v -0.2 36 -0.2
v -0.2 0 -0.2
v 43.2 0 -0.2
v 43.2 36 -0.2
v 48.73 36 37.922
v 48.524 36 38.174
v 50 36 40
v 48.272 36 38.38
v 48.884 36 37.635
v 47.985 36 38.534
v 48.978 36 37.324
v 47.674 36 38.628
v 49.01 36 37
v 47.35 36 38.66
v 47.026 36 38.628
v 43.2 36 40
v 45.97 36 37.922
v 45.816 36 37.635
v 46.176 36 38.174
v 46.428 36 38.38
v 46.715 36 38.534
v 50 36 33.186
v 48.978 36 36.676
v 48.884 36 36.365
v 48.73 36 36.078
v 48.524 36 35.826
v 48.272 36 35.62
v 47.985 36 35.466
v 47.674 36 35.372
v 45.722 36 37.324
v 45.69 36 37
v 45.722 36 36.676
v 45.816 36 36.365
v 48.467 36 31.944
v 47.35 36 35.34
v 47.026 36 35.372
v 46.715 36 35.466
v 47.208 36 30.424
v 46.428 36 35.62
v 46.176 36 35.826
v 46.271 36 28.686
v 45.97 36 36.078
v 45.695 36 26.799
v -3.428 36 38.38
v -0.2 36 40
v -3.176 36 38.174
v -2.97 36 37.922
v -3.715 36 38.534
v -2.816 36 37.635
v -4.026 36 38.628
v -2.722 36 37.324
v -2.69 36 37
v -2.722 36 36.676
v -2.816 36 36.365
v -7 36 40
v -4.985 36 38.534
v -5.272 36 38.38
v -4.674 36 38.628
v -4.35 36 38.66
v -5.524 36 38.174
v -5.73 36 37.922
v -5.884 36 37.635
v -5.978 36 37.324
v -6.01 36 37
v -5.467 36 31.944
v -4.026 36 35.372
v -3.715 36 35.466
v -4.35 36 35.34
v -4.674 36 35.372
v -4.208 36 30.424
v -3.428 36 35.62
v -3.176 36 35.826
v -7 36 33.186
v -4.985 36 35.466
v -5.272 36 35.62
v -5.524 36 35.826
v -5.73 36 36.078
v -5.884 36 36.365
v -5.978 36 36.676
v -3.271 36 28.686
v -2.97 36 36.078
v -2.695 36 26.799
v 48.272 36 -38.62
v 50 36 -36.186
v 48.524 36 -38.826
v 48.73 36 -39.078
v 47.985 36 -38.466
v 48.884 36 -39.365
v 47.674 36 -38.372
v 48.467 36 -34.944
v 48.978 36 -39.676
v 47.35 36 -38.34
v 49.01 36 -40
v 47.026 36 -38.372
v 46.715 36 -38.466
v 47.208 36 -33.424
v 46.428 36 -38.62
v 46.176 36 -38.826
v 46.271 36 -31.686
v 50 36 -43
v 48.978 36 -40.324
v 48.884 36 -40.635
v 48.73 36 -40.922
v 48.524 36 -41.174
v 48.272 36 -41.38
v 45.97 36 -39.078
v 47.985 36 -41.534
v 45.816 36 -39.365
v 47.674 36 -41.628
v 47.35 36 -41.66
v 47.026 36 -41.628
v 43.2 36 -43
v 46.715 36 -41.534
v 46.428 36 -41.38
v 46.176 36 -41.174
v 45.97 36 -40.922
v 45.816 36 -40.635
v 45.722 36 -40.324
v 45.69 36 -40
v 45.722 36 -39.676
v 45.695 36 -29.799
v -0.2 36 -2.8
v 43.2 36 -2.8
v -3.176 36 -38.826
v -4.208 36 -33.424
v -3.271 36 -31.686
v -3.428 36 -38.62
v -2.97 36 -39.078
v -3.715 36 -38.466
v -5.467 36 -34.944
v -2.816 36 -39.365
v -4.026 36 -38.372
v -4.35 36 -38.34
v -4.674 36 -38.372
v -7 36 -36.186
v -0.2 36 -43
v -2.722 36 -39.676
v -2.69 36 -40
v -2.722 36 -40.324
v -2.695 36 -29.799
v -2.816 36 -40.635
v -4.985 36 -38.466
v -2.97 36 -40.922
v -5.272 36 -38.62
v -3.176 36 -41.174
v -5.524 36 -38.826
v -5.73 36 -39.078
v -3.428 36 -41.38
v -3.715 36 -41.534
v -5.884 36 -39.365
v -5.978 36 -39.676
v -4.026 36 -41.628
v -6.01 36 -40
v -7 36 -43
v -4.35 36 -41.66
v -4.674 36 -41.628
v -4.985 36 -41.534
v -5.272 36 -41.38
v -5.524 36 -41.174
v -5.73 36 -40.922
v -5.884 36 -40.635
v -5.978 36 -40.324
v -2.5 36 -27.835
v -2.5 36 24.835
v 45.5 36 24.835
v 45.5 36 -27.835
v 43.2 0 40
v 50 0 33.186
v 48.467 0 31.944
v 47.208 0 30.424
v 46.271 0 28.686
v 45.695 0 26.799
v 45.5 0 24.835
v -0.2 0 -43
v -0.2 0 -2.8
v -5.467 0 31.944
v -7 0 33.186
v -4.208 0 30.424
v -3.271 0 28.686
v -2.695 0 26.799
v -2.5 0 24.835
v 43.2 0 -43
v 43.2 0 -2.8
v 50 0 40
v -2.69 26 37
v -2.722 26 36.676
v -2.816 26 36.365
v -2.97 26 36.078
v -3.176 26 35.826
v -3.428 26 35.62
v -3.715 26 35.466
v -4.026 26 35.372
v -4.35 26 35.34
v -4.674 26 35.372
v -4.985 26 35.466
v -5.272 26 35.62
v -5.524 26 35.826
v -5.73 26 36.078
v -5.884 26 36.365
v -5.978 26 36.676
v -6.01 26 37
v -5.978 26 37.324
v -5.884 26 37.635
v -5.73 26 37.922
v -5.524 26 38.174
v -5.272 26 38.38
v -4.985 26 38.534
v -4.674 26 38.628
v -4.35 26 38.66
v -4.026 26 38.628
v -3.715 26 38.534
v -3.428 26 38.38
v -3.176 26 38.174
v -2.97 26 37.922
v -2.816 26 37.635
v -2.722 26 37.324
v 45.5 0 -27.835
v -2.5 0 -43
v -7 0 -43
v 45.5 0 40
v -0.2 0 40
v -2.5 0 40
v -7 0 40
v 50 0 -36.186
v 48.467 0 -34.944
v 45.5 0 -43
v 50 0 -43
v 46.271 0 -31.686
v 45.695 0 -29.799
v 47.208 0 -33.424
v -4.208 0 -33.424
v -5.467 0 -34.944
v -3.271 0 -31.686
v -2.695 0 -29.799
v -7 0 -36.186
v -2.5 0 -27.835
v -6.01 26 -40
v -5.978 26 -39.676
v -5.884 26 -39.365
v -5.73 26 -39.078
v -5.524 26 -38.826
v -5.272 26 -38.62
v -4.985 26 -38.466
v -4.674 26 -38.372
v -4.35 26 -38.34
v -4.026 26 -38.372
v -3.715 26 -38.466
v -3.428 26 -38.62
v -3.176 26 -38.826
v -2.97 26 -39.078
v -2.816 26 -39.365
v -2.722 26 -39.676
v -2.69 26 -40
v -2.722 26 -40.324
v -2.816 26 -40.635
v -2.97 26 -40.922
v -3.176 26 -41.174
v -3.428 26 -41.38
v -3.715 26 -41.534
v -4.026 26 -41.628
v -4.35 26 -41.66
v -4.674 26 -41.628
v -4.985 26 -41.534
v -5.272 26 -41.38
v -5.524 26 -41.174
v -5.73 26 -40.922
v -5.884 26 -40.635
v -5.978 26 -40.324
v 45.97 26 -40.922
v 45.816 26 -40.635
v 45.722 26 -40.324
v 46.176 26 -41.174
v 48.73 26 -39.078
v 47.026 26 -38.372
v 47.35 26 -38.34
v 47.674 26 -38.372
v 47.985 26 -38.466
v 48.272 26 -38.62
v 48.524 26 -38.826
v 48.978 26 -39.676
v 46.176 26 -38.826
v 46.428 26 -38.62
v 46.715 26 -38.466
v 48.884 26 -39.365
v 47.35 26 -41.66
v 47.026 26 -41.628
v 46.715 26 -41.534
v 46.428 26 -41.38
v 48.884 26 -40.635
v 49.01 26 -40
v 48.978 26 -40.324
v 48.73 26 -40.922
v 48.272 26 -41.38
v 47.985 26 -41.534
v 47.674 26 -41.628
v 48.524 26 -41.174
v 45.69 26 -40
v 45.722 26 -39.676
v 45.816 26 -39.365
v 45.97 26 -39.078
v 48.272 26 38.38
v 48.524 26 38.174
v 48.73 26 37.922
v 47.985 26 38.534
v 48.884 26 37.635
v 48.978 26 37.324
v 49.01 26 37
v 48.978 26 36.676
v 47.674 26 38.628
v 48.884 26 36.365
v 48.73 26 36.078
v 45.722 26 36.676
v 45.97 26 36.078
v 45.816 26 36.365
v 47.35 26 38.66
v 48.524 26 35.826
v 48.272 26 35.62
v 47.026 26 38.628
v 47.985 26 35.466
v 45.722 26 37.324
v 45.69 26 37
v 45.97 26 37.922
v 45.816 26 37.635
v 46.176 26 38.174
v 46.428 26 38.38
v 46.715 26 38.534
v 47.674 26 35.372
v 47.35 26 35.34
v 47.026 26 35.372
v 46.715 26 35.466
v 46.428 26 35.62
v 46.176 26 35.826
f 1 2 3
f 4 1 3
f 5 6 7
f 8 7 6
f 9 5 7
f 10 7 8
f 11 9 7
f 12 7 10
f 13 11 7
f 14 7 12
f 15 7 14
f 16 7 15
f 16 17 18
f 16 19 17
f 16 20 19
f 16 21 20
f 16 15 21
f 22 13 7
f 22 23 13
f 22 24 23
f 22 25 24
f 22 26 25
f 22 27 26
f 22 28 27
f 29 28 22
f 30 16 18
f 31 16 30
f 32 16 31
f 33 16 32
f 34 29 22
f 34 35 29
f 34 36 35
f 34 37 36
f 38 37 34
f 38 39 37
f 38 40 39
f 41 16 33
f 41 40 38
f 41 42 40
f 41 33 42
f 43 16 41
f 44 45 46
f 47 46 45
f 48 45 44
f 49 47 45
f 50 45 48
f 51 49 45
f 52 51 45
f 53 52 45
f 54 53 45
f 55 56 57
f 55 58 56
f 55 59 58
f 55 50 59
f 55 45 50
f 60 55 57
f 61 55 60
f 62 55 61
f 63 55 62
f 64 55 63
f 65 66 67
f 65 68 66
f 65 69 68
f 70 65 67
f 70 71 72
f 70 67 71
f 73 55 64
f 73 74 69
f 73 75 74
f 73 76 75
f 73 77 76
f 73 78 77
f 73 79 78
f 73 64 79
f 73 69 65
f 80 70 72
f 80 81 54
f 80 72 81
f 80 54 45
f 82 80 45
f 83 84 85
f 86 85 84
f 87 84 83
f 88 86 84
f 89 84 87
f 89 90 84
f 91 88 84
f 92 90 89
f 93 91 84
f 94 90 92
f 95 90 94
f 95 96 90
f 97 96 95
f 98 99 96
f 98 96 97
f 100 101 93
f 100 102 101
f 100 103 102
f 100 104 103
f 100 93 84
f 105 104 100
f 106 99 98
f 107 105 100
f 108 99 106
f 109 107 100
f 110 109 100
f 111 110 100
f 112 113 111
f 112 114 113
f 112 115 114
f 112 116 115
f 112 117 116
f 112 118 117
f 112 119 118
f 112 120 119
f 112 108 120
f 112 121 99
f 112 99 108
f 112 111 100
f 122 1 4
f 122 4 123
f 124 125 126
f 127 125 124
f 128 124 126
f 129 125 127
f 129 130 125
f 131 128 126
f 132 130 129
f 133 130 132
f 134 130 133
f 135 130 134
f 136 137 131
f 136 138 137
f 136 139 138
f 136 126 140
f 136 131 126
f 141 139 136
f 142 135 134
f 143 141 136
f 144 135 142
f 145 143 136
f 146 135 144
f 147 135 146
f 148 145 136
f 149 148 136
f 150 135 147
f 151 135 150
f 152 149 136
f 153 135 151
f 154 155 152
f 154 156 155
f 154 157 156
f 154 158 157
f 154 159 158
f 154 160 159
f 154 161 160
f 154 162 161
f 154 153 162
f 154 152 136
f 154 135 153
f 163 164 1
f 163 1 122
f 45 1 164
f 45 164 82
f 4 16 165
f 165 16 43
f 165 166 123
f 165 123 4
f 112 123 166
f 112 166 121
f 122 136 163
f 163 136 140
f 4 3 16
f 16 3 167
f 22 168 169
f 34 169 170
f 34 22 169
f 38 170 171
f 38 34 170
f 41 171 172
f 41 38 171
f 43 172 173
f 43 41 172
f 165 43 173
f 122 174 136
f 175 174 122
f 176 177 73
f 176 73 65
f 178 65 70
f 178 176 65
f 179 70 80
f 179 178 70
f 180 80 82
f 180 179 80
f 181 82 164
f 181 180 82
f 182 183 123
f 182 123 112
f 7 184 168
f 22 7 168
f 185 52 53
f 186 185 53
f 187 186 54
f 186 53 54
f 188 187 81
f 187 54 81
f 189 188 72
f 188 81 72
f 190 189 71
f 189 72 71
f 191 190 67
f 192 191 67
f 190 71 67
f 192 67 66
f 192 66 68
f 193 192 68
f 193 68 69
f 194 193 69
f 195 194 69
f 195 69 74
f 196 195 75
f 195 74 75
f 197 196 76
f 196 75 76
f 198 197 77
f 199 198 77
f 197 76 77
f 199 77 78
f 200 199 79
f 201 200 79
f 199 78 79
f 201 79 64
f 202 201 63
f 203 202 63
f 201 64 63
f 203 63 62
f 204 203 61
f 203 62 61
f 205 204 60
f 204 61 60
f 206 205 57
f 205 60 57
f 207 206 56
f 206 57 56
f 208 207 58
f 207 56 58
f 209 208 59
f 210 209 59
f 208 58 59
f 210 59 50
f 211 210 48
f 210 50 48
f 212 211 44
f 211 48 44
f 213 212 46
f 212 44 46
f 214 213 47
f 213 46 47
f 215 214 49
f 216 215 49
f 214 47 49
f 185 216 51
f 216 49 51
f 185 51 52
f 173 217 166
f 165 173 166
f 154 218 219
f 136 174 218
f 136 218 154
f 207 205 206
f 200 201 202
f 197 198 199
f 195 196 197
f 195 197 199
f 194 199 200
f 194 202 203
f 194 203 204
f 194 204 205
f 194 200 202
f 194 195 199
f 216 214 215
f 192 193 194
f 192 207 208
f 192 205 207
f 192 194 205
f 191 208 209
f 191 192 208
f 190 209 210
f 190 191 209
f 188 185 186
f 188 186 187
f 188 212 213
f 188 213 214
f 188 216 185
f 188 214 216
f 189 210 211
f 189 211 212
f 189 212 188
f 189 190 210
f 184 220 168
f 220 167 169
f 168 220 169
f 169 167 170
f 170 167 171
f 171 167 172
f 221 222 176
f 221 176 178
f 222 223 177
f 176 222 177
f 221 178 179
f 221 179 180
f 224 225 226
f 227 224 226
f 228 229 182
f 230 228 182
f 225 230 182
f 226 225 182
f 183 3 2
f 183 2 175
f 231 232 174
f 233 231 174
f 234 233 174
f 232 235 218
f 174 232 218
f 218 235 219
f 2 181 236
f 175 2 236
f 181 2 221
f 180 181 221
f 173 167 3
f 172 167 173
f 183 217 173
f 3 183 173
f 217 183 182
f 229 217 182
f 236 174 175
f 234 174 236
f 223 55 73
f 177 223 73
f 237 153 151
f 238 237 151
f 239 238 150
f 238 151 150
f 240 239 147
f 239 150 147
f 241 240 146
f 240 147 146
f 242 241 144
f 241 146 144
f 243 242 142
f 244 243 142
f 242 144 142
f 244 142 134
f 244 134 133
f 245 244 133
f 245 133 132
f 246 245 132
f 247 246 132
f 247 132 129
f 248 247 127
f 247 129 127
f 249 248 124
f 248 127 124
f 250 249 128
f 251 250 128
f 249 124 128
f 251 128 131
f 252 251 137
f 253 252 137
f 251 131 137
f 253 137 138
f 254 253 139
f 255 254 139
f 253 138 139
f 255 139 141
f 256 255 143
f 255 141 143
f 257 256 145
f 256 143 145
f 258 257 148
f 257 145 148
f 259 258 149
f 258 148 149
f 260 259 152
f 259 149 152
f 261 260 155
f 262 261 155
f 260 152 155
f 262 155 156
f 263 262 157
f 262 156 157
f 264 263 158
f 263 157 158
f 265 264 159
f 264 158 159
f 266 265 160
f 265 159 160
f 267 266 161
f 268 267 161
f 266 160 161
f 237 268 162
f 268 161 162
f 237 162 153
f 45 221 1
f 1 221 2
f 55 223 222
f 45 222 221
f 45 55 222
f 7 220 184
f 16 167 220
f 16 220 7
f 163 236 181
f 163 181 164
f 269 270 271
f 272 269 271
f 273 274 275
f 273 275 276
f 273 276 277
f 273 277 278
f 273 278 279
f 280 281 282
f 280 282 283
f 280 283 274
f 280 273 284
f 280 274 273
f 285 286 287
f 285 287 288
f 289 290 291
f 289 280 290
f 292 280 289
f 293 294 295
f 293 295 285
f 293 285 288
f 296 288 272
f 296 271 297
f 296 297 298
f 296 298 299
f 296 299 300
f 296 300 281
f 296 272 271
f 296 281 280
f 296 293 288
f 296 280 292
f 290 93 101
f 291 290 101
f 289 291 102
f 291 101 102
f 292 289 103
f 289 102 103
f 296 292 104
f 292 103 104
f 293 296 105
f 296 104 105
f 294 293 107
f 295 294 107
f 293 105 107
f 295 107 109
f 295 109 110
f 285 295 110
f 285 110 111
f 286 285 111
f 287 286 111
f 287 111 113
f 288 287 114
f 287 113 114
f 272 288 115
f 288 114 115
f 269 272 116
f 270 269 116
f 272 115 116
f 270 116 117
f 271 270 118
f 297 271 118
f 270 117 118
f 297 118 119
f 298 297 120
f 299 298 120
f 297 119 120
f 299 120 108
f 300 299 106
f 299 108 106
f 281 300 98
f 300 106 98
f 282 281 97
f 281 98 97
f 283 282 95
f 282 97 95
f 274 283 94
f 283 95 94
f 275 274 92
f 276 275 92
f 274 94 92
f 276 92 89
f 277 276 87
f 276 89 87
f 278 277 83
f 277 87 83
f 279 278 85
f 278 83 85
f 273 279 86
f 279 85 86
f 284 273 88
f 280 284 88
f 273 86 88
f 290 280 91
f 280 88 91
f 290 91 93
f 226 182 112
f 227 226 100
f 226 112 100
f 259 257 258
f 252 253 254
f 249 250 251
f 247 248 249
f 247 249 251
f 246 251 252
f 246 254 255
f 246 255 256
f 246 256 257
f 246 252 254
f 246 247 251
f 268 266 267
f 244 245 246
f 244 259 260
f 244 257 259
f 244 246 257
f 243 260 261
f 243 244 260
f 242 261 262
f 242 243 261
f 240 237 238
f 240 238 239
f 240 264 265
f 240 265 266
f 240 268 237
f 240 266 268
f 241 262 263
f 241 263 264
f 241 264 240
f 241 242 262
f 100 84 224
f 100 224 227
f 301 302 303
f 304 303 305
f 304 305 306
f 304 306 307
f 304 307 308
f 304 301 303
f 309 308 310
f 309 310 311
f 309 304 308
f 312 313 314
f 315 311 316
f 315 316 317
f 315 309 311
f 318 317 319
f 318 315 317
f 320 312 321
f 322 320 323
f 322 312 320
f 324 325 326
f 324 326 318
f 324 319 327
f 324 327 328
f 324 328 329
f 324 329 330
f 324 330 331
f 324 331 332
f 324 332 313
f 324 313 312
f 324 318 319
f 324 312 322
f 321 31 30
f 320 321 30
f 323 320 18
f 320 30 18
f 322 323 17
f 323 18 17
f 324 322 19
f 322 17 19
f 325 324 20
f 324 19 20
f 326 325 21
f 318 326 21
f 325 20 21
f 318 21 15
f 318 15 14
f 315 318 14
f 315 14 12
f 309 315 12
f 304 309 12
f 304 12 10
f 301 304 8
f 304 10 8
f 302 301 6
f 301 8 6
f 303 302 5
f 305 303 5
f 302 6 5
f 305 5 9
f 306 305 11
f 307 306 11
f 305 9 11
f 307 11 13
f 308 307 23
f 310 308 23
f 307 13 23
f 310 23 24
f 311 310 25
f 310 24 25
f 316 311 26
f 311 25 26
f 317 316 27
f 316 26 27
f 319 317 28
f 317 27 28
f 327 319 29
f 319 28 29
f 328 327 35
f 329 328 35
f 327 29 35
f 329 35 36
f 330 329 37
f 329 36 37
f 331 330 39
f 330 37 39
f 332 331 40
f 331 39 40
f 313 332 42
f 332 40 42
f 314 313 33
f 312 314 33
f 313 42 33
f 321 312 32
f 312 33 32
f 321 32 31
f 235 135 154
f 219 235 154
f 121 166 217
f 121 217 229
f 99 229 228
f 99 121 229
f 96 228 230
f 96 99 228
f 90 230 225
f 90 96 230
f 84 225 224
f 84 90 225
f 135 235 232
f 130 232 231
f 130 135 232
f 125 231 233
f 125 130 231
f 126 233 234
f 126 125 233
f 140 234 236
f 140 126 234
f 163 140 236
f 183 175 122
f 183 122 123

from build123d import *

# Parameters (mm, degrees)
ESQUISSE1_W                  = 43
ESQUISSE1_H                  = 43
BOSS_EXTRU_1_DEPTH           = 40
ESQUISSE2_W                  = 48
ESQUISSE2_H                  = 48
BOSS_EXTRU_2_DEPTH           = 1.5
ENL_V_MAT_EXTRU_3_REACH      = 79.293
ESQUISSE5_W                  = 8
ESQUISSE5_H                  = 5
ENL_V_MAT_EXTRU_4_REACH      = 78.569
ESQUISSE6_W                  = 54.781223227
ESQUISSE6_H                  = 3.078773465
ENL_V_MAT_EXTRU_5_DEPTH      = 9.5
ENL_V_MAT_EXTRU_6_DEPTH      = 73.216687822
ENL_V_MAT_EXTRU_6_DEPTH_BACK = 73.216687822
ESQUISSE9_W                  = 82.255914314
ESQUISSE9_H                  = 90.950558943
ENL_V_MAT_EXTRU_7_DEPTH      = 9.5
ESQUISSE10_W                 = 6
ESQUISSE10_H                 = 36
BOSS_EXTRU_3_DEPTH           = 6
CONG_1_R                     = 10
ESQUISSE11_W                 = 6
ESQUISSE11_H                 = 36
BOSS_EXTRU_4_DEPTH           = 6
CONG_2_R                     = 10
ESQUISSE12_R                 = 1.66
ENL_V_MAT_EXTRU_8_DEPTH      = 10
ESQUISSE13_W                 = 5.657897309
ESQUISSE13_H                 = 15.126215254
ENL_V_MAT_EXTRU_9_DEPTH      = 77.139674284


with BuildPart() as part:
    # Esquisse1 → Boss.-Extru.1 (new body)
    with BuildSketch(Plane.XY):
        Polygon((-2.5, 43), (-2.5, -2.5), (0, -2.5), (45.5, -2.5), (45.5, 43), (45.5, 45.5), (-2.5, 45.5), align=None)
        with Locations((21.5, 21.5)):
            Rectangle(ESQUISSE1_W, ESQUISSE1_H, mode=Mode.SUBTRACT)
    extrude(amount=BOSS_EXTRU_1_DEPTH)

    # Esquisse2 → Boss.-Extru.2 (add)
    with BuildSketch(Plane.XY):
        with Locations((21.5, 21.5)):
            Rectangle(ESQUISSE2_W, ESQUISSE2_H)
    extrude(amount=-BOSS_EXTRU_2_DEPTH)

    # Esquisse5 → Enlèv. mat.-Extru.3 (cut, up to next)
    with BuildSketch(Plane(origin=(0, 45.5, 0), x_dir=(1, 0, 0), z_dir=(0, 1, 0)), mode=Mode.PRIVATE) as enl_v_mat_extru_3_sk1:
        with Locations((21.5, -6.3)):
            Rectangle(ESQUISSE5_W, ESQUISSE5_H)
    enl_v_mat_extru_3_tool1 = extrude(enl_v_mat_extru_3_sk1.sketch, amount=-ENL_V_MAT_EXTRU_3_REACH, mode=Mode.PRIVATE) & part.part
    add(enl_v_mat_extru_3_tool1.solids().sort_by_distance((21.5, 45.5, 6.3))[0], mode=Mode.SUBTRACT)

    # Esquisse6 → Enlèv. mat.-Extru.4 (cut, up to next)
    with BuildSketch(Plane.XY.offset(40), mode=Mode.PRIVATE) as enl_v_mat_extru_4_sk1:
        with Locations((23.162986277, -1.539386733)):
            Rectangle(ESQUISSE6_W, ESQUISSE6_H)
    enl_v_mat_extru_4_tool1 = extrude(enl_v_mat_extru_4_sk1.sketch, amount=-ENL_V_MAT_EXTRU_4_REACH, mode=Mode.PRIVATE) & part.part
    add(enl_v_mat_extru_4_tool1.solids().sort_by_distance((23.162986, -1.539387, 40))[0], mode=Mode.SUBTRACT)

    # Symétrie1: part across plane


with BuildPart() as part_1:
    add(part.part)
    add(part.part.mirror(Plane.XY.offset(-1.5)))

    # Esquisse7 → Enlèv. mat.-Extru.5 (cut)
    with BuildSketch(Plane(origin=(0, 45.5, 0), x_dir=(1, 0, 0), z_dir=(0, 1, 0))):
        Polygon((-2.5, 7.8), (0, 7.8), (0, 12.8), (-2.5, 12.8), (-2.5, 25.4), (0, 25.4), (0, 30.4), (-2.5, 30.4), (-2.5, 43), (45.5, 43), (45.5, 30.4), (43, 30.4), (43, 25.4), (45.5, 25.4), (45.5, 12.8), (43, 12.8), (43, 7.8), (45.5, 7.8), (45.5, -4.8), (43, -4.8), (43, -9.8), (45.5, -9.8), (45.5, -22.4), (43, -22.4), (43, -27.4), (45.5, -27.4), (45.5, -40), (-2.5, -40), (-2.5, -27.4), (0, -27.4), (0, -22.4), (-2.5, -22.4), (-2.5, -9.8), (0, -9.8), (0, -4.8), (-2.5, -4.8), align=None)
    extrude(amount=-ENL_V_MAT_EXTRU_5_DEPTH, mode=Mode.SUBTRACT)

    # Esquisse8 → Enlèv. mat.-Extru.6 (cut, two sides: drawn at the far end of the back side and taken through both)
    with BuildSketch(Plane(origin=(0, 36, 0), x_dir=(1, 0, 0), z_dir=(0, 1, 0)).offset(-ENL_V_MAT_EXTRU_6_DEPTH_BACK)):
        Polygon((-0.2, 43), (-0.2, 2.8), (43.2, 2.8), (43.2, 43), (43, 43), (43, 3), (0, 3), (0, 43), align=None)
        Polygon((0, 0), (0, -40), (-0.2, -40), (-0.2, 0.2), (43.2, 0.2), (43.2, -40), (43, -40), (43, 0), align=None)
    extrude(amount=ENL_V_MAT_EXTRU_6_DEPTH + ENL_V_MAT_EXTRU_6_DEPTH_BACK, mode=Mode.SUBTRACT)

    # Esquisse9 → Enlèv. mat.-Extru.7 (cut)
    with BuildSketch(Plane(origin=(0, 45.5, 0), x_dir=(1, 0, 0), z_dir=(0, 1, 0))):
        with Locations((21.348833146, 1.614403219)):
            Rectangle(ESQUISSE9_W, ESQUISSE9_H)
    extrude(amount=-ENL_V_MAT_EXTRU_7_DEPTH, mode=Mode.SUBTRACT)

    # Esquisse10 → Boss.-Extru.3 (add)
    with BuildSketch(Plane(origin=(45.5, 0, 0), x_dir=(0, 0, -1), z_dir=(1, 0, 0))):
        with Locations((-37, 18)):
            Rectangle(ESQUISSE10_W, ESQUISSE10_H)
        with Locations((40, 18)):
            Rectangle(ESQUISSE10_W, ESQUISSE10_H)
    extrude(amount=BOSS_EXTRU_3_DEPTH)

    # Congé1
    # the kernel refuses this fillet: 10 mm, written as the material it adds along each edge
    with BuildSketch(Plane(origin=(45.5, 36, 34), x_dir=(1, 0, 0), z_dir=(0, -1, 0))) as cong_1_piece_1:
        with BuildLine():
            CenterArc((10, -9.16515139), CONG_1_R, 113.578178478, 66.421821522)
            Line((0, -9.16515139), (-0.2, -9.16515139))
            Line((-0.2, -9.16515139), (-0.2, 0))
            Line((-0.2, 0), (0, 0.2))
            ThreePointArc((0, 0.2), (3, 0.2), (5.92, 0.183303028))
            Line((5.92, 0.183303028), (6, 0))
        make_face()
    extrude(amount=36)
    with BuildSketch(Plane(origin=(45.5, 36, -37), x_dir=(0, 0, 1), z_dir=(0, -1, 0))) as cong_1_piece_2:
        with BuildLine():
            CenterArc((9.16515139, -10), CONG_1_R, 90, 66.421821522)
            Line((0, -6), (-0.183303028, -5.92))
            ThreePointArc((-0.183303028, -5.92), (-0.2, -3), (-0.2, 0))
            Line((-0.2, 0), (0, 0.2))
            Line((0, 0.2), (9.16515139, 0.2))
            Line((9.16515139, 0.2), (9.16515139, 0))
        make_face()
    extrude(amount=36)

    # Esquisse11 → Boss.-Extru.4 (add)
    with BuildSketch(Plane.ZY.offset(2.5)):
        with Locations((-40, 18)):
            Rectangle(ESQUISSE11_W, ESQUISSE11_H)
        with Locations((37, 18)):
            Rectangle(ESQUISSE11_W, ESQUISSE11_H)
    extrude(amount=BOSS_EXTRU_4_DEPTH)

    # Congé2
    # the kernel refuses this fillet: 10 mm, written as the material it adds along each edge
    with BuildSketch(Plane(origin=(-2.5, 0, 34), x_dir=(-1, 0, 0), z_dir=(0, 1, 0))) as cong_2_piece_1:
        with BuildLine():
            CenterArc((10, -9.16515139), CONG_2_R, 113.578178478, 66.421821522)
            Line((0, -9.16515139), (-0.2, -9.16515139))
            Line((-0.2, -9.16515139), (-0.2, 0))
            Line((-0.2, 0), (0, 0.2))
            ThreePointArc((0, 0.2), (3, 0.2), (5.92, 0.183303028))
            Line((5.92, 0.183303028), (6, 0))
        make_face()
    extrude(amount=36)
    with BuildSketch(Plane(origin=(-2.5, 36, -37), x_dir=(0, 0, 1), z_dir=(0, -1, 0))) as cong_2_piece_2:
        with BuildLine():
            CenterArc((9.16515139, 10), CONG_2_R, 203.578178478, 66.421821522)
            Line((0, 6), (-0.183303028, 5.92))
            ThreePointArc((-0.183303028, 5.92), (-0.2, 3), (-0.2, 0))
            Line((-0.2, 0), (0, -0.2))
            Line((0, -0.2), (9.16515139, -0.2))
            Line((9.16515139, -0.2), (9.16515139, 0))
        make_face()
    extrude(amount=36)

    # Esquisse12 → Enlèv. mat.-Extru.8 (cut)
    with BuildSketch(Plane(origin=(0, 36, 0), x_dir=(1, 0, 0), z_dir=(0, 1, 0))):
        with Locations(Location((-4.35, 40, 0), (0, 0, 180))):
            Circle(ESQUISSE12_R)
        with Locations((47.35, 40)):
            Circle(ESQUISSE12_R)
        with Locations(Location((47.35, -37, 0), (0, 0, 180))):
            Circle(ESQUISSE12_R)
        with Locations((-4.35, -37)):
            Circle(ESQUISSE12_R)
    extrude(amount=-ENL_V_MAT_EXTRU_8_DEPTH, mode=Mode.SUBTRACT)

    # Esquisse13 → Enlèv. mat.-Extru.9 (cut, through all)
    with BuildSketch(Plane(origin=(0, 36, 0), x_dir=(1, 0, 0), z_dir=(0, 1, 0))):
        with Locations((52.828948655, 38.373658998)):
            Rectangle(ESQUISSE13_W, ESQUISSE13_H)
        with Locations((52.828948655, -35.373658998)):
            Rectangle(ESQUISSE13_W, ESQUISSE13_H)
        with Locations((-9.828948654, 38.373658998)):
            Rectangle(ESQUISSE13_W, ESQUISSE13_H)
        with Locations((-9.828948654, -35.373658998)):
            Rectangle(ESQUISSE13_W, ESQUISSE13_H)
    extrude(amount=-ENL_V_MAT_EXTRU_9_DEPTH, mode=Mode.SUBTRACT)


solid = part_1.part
